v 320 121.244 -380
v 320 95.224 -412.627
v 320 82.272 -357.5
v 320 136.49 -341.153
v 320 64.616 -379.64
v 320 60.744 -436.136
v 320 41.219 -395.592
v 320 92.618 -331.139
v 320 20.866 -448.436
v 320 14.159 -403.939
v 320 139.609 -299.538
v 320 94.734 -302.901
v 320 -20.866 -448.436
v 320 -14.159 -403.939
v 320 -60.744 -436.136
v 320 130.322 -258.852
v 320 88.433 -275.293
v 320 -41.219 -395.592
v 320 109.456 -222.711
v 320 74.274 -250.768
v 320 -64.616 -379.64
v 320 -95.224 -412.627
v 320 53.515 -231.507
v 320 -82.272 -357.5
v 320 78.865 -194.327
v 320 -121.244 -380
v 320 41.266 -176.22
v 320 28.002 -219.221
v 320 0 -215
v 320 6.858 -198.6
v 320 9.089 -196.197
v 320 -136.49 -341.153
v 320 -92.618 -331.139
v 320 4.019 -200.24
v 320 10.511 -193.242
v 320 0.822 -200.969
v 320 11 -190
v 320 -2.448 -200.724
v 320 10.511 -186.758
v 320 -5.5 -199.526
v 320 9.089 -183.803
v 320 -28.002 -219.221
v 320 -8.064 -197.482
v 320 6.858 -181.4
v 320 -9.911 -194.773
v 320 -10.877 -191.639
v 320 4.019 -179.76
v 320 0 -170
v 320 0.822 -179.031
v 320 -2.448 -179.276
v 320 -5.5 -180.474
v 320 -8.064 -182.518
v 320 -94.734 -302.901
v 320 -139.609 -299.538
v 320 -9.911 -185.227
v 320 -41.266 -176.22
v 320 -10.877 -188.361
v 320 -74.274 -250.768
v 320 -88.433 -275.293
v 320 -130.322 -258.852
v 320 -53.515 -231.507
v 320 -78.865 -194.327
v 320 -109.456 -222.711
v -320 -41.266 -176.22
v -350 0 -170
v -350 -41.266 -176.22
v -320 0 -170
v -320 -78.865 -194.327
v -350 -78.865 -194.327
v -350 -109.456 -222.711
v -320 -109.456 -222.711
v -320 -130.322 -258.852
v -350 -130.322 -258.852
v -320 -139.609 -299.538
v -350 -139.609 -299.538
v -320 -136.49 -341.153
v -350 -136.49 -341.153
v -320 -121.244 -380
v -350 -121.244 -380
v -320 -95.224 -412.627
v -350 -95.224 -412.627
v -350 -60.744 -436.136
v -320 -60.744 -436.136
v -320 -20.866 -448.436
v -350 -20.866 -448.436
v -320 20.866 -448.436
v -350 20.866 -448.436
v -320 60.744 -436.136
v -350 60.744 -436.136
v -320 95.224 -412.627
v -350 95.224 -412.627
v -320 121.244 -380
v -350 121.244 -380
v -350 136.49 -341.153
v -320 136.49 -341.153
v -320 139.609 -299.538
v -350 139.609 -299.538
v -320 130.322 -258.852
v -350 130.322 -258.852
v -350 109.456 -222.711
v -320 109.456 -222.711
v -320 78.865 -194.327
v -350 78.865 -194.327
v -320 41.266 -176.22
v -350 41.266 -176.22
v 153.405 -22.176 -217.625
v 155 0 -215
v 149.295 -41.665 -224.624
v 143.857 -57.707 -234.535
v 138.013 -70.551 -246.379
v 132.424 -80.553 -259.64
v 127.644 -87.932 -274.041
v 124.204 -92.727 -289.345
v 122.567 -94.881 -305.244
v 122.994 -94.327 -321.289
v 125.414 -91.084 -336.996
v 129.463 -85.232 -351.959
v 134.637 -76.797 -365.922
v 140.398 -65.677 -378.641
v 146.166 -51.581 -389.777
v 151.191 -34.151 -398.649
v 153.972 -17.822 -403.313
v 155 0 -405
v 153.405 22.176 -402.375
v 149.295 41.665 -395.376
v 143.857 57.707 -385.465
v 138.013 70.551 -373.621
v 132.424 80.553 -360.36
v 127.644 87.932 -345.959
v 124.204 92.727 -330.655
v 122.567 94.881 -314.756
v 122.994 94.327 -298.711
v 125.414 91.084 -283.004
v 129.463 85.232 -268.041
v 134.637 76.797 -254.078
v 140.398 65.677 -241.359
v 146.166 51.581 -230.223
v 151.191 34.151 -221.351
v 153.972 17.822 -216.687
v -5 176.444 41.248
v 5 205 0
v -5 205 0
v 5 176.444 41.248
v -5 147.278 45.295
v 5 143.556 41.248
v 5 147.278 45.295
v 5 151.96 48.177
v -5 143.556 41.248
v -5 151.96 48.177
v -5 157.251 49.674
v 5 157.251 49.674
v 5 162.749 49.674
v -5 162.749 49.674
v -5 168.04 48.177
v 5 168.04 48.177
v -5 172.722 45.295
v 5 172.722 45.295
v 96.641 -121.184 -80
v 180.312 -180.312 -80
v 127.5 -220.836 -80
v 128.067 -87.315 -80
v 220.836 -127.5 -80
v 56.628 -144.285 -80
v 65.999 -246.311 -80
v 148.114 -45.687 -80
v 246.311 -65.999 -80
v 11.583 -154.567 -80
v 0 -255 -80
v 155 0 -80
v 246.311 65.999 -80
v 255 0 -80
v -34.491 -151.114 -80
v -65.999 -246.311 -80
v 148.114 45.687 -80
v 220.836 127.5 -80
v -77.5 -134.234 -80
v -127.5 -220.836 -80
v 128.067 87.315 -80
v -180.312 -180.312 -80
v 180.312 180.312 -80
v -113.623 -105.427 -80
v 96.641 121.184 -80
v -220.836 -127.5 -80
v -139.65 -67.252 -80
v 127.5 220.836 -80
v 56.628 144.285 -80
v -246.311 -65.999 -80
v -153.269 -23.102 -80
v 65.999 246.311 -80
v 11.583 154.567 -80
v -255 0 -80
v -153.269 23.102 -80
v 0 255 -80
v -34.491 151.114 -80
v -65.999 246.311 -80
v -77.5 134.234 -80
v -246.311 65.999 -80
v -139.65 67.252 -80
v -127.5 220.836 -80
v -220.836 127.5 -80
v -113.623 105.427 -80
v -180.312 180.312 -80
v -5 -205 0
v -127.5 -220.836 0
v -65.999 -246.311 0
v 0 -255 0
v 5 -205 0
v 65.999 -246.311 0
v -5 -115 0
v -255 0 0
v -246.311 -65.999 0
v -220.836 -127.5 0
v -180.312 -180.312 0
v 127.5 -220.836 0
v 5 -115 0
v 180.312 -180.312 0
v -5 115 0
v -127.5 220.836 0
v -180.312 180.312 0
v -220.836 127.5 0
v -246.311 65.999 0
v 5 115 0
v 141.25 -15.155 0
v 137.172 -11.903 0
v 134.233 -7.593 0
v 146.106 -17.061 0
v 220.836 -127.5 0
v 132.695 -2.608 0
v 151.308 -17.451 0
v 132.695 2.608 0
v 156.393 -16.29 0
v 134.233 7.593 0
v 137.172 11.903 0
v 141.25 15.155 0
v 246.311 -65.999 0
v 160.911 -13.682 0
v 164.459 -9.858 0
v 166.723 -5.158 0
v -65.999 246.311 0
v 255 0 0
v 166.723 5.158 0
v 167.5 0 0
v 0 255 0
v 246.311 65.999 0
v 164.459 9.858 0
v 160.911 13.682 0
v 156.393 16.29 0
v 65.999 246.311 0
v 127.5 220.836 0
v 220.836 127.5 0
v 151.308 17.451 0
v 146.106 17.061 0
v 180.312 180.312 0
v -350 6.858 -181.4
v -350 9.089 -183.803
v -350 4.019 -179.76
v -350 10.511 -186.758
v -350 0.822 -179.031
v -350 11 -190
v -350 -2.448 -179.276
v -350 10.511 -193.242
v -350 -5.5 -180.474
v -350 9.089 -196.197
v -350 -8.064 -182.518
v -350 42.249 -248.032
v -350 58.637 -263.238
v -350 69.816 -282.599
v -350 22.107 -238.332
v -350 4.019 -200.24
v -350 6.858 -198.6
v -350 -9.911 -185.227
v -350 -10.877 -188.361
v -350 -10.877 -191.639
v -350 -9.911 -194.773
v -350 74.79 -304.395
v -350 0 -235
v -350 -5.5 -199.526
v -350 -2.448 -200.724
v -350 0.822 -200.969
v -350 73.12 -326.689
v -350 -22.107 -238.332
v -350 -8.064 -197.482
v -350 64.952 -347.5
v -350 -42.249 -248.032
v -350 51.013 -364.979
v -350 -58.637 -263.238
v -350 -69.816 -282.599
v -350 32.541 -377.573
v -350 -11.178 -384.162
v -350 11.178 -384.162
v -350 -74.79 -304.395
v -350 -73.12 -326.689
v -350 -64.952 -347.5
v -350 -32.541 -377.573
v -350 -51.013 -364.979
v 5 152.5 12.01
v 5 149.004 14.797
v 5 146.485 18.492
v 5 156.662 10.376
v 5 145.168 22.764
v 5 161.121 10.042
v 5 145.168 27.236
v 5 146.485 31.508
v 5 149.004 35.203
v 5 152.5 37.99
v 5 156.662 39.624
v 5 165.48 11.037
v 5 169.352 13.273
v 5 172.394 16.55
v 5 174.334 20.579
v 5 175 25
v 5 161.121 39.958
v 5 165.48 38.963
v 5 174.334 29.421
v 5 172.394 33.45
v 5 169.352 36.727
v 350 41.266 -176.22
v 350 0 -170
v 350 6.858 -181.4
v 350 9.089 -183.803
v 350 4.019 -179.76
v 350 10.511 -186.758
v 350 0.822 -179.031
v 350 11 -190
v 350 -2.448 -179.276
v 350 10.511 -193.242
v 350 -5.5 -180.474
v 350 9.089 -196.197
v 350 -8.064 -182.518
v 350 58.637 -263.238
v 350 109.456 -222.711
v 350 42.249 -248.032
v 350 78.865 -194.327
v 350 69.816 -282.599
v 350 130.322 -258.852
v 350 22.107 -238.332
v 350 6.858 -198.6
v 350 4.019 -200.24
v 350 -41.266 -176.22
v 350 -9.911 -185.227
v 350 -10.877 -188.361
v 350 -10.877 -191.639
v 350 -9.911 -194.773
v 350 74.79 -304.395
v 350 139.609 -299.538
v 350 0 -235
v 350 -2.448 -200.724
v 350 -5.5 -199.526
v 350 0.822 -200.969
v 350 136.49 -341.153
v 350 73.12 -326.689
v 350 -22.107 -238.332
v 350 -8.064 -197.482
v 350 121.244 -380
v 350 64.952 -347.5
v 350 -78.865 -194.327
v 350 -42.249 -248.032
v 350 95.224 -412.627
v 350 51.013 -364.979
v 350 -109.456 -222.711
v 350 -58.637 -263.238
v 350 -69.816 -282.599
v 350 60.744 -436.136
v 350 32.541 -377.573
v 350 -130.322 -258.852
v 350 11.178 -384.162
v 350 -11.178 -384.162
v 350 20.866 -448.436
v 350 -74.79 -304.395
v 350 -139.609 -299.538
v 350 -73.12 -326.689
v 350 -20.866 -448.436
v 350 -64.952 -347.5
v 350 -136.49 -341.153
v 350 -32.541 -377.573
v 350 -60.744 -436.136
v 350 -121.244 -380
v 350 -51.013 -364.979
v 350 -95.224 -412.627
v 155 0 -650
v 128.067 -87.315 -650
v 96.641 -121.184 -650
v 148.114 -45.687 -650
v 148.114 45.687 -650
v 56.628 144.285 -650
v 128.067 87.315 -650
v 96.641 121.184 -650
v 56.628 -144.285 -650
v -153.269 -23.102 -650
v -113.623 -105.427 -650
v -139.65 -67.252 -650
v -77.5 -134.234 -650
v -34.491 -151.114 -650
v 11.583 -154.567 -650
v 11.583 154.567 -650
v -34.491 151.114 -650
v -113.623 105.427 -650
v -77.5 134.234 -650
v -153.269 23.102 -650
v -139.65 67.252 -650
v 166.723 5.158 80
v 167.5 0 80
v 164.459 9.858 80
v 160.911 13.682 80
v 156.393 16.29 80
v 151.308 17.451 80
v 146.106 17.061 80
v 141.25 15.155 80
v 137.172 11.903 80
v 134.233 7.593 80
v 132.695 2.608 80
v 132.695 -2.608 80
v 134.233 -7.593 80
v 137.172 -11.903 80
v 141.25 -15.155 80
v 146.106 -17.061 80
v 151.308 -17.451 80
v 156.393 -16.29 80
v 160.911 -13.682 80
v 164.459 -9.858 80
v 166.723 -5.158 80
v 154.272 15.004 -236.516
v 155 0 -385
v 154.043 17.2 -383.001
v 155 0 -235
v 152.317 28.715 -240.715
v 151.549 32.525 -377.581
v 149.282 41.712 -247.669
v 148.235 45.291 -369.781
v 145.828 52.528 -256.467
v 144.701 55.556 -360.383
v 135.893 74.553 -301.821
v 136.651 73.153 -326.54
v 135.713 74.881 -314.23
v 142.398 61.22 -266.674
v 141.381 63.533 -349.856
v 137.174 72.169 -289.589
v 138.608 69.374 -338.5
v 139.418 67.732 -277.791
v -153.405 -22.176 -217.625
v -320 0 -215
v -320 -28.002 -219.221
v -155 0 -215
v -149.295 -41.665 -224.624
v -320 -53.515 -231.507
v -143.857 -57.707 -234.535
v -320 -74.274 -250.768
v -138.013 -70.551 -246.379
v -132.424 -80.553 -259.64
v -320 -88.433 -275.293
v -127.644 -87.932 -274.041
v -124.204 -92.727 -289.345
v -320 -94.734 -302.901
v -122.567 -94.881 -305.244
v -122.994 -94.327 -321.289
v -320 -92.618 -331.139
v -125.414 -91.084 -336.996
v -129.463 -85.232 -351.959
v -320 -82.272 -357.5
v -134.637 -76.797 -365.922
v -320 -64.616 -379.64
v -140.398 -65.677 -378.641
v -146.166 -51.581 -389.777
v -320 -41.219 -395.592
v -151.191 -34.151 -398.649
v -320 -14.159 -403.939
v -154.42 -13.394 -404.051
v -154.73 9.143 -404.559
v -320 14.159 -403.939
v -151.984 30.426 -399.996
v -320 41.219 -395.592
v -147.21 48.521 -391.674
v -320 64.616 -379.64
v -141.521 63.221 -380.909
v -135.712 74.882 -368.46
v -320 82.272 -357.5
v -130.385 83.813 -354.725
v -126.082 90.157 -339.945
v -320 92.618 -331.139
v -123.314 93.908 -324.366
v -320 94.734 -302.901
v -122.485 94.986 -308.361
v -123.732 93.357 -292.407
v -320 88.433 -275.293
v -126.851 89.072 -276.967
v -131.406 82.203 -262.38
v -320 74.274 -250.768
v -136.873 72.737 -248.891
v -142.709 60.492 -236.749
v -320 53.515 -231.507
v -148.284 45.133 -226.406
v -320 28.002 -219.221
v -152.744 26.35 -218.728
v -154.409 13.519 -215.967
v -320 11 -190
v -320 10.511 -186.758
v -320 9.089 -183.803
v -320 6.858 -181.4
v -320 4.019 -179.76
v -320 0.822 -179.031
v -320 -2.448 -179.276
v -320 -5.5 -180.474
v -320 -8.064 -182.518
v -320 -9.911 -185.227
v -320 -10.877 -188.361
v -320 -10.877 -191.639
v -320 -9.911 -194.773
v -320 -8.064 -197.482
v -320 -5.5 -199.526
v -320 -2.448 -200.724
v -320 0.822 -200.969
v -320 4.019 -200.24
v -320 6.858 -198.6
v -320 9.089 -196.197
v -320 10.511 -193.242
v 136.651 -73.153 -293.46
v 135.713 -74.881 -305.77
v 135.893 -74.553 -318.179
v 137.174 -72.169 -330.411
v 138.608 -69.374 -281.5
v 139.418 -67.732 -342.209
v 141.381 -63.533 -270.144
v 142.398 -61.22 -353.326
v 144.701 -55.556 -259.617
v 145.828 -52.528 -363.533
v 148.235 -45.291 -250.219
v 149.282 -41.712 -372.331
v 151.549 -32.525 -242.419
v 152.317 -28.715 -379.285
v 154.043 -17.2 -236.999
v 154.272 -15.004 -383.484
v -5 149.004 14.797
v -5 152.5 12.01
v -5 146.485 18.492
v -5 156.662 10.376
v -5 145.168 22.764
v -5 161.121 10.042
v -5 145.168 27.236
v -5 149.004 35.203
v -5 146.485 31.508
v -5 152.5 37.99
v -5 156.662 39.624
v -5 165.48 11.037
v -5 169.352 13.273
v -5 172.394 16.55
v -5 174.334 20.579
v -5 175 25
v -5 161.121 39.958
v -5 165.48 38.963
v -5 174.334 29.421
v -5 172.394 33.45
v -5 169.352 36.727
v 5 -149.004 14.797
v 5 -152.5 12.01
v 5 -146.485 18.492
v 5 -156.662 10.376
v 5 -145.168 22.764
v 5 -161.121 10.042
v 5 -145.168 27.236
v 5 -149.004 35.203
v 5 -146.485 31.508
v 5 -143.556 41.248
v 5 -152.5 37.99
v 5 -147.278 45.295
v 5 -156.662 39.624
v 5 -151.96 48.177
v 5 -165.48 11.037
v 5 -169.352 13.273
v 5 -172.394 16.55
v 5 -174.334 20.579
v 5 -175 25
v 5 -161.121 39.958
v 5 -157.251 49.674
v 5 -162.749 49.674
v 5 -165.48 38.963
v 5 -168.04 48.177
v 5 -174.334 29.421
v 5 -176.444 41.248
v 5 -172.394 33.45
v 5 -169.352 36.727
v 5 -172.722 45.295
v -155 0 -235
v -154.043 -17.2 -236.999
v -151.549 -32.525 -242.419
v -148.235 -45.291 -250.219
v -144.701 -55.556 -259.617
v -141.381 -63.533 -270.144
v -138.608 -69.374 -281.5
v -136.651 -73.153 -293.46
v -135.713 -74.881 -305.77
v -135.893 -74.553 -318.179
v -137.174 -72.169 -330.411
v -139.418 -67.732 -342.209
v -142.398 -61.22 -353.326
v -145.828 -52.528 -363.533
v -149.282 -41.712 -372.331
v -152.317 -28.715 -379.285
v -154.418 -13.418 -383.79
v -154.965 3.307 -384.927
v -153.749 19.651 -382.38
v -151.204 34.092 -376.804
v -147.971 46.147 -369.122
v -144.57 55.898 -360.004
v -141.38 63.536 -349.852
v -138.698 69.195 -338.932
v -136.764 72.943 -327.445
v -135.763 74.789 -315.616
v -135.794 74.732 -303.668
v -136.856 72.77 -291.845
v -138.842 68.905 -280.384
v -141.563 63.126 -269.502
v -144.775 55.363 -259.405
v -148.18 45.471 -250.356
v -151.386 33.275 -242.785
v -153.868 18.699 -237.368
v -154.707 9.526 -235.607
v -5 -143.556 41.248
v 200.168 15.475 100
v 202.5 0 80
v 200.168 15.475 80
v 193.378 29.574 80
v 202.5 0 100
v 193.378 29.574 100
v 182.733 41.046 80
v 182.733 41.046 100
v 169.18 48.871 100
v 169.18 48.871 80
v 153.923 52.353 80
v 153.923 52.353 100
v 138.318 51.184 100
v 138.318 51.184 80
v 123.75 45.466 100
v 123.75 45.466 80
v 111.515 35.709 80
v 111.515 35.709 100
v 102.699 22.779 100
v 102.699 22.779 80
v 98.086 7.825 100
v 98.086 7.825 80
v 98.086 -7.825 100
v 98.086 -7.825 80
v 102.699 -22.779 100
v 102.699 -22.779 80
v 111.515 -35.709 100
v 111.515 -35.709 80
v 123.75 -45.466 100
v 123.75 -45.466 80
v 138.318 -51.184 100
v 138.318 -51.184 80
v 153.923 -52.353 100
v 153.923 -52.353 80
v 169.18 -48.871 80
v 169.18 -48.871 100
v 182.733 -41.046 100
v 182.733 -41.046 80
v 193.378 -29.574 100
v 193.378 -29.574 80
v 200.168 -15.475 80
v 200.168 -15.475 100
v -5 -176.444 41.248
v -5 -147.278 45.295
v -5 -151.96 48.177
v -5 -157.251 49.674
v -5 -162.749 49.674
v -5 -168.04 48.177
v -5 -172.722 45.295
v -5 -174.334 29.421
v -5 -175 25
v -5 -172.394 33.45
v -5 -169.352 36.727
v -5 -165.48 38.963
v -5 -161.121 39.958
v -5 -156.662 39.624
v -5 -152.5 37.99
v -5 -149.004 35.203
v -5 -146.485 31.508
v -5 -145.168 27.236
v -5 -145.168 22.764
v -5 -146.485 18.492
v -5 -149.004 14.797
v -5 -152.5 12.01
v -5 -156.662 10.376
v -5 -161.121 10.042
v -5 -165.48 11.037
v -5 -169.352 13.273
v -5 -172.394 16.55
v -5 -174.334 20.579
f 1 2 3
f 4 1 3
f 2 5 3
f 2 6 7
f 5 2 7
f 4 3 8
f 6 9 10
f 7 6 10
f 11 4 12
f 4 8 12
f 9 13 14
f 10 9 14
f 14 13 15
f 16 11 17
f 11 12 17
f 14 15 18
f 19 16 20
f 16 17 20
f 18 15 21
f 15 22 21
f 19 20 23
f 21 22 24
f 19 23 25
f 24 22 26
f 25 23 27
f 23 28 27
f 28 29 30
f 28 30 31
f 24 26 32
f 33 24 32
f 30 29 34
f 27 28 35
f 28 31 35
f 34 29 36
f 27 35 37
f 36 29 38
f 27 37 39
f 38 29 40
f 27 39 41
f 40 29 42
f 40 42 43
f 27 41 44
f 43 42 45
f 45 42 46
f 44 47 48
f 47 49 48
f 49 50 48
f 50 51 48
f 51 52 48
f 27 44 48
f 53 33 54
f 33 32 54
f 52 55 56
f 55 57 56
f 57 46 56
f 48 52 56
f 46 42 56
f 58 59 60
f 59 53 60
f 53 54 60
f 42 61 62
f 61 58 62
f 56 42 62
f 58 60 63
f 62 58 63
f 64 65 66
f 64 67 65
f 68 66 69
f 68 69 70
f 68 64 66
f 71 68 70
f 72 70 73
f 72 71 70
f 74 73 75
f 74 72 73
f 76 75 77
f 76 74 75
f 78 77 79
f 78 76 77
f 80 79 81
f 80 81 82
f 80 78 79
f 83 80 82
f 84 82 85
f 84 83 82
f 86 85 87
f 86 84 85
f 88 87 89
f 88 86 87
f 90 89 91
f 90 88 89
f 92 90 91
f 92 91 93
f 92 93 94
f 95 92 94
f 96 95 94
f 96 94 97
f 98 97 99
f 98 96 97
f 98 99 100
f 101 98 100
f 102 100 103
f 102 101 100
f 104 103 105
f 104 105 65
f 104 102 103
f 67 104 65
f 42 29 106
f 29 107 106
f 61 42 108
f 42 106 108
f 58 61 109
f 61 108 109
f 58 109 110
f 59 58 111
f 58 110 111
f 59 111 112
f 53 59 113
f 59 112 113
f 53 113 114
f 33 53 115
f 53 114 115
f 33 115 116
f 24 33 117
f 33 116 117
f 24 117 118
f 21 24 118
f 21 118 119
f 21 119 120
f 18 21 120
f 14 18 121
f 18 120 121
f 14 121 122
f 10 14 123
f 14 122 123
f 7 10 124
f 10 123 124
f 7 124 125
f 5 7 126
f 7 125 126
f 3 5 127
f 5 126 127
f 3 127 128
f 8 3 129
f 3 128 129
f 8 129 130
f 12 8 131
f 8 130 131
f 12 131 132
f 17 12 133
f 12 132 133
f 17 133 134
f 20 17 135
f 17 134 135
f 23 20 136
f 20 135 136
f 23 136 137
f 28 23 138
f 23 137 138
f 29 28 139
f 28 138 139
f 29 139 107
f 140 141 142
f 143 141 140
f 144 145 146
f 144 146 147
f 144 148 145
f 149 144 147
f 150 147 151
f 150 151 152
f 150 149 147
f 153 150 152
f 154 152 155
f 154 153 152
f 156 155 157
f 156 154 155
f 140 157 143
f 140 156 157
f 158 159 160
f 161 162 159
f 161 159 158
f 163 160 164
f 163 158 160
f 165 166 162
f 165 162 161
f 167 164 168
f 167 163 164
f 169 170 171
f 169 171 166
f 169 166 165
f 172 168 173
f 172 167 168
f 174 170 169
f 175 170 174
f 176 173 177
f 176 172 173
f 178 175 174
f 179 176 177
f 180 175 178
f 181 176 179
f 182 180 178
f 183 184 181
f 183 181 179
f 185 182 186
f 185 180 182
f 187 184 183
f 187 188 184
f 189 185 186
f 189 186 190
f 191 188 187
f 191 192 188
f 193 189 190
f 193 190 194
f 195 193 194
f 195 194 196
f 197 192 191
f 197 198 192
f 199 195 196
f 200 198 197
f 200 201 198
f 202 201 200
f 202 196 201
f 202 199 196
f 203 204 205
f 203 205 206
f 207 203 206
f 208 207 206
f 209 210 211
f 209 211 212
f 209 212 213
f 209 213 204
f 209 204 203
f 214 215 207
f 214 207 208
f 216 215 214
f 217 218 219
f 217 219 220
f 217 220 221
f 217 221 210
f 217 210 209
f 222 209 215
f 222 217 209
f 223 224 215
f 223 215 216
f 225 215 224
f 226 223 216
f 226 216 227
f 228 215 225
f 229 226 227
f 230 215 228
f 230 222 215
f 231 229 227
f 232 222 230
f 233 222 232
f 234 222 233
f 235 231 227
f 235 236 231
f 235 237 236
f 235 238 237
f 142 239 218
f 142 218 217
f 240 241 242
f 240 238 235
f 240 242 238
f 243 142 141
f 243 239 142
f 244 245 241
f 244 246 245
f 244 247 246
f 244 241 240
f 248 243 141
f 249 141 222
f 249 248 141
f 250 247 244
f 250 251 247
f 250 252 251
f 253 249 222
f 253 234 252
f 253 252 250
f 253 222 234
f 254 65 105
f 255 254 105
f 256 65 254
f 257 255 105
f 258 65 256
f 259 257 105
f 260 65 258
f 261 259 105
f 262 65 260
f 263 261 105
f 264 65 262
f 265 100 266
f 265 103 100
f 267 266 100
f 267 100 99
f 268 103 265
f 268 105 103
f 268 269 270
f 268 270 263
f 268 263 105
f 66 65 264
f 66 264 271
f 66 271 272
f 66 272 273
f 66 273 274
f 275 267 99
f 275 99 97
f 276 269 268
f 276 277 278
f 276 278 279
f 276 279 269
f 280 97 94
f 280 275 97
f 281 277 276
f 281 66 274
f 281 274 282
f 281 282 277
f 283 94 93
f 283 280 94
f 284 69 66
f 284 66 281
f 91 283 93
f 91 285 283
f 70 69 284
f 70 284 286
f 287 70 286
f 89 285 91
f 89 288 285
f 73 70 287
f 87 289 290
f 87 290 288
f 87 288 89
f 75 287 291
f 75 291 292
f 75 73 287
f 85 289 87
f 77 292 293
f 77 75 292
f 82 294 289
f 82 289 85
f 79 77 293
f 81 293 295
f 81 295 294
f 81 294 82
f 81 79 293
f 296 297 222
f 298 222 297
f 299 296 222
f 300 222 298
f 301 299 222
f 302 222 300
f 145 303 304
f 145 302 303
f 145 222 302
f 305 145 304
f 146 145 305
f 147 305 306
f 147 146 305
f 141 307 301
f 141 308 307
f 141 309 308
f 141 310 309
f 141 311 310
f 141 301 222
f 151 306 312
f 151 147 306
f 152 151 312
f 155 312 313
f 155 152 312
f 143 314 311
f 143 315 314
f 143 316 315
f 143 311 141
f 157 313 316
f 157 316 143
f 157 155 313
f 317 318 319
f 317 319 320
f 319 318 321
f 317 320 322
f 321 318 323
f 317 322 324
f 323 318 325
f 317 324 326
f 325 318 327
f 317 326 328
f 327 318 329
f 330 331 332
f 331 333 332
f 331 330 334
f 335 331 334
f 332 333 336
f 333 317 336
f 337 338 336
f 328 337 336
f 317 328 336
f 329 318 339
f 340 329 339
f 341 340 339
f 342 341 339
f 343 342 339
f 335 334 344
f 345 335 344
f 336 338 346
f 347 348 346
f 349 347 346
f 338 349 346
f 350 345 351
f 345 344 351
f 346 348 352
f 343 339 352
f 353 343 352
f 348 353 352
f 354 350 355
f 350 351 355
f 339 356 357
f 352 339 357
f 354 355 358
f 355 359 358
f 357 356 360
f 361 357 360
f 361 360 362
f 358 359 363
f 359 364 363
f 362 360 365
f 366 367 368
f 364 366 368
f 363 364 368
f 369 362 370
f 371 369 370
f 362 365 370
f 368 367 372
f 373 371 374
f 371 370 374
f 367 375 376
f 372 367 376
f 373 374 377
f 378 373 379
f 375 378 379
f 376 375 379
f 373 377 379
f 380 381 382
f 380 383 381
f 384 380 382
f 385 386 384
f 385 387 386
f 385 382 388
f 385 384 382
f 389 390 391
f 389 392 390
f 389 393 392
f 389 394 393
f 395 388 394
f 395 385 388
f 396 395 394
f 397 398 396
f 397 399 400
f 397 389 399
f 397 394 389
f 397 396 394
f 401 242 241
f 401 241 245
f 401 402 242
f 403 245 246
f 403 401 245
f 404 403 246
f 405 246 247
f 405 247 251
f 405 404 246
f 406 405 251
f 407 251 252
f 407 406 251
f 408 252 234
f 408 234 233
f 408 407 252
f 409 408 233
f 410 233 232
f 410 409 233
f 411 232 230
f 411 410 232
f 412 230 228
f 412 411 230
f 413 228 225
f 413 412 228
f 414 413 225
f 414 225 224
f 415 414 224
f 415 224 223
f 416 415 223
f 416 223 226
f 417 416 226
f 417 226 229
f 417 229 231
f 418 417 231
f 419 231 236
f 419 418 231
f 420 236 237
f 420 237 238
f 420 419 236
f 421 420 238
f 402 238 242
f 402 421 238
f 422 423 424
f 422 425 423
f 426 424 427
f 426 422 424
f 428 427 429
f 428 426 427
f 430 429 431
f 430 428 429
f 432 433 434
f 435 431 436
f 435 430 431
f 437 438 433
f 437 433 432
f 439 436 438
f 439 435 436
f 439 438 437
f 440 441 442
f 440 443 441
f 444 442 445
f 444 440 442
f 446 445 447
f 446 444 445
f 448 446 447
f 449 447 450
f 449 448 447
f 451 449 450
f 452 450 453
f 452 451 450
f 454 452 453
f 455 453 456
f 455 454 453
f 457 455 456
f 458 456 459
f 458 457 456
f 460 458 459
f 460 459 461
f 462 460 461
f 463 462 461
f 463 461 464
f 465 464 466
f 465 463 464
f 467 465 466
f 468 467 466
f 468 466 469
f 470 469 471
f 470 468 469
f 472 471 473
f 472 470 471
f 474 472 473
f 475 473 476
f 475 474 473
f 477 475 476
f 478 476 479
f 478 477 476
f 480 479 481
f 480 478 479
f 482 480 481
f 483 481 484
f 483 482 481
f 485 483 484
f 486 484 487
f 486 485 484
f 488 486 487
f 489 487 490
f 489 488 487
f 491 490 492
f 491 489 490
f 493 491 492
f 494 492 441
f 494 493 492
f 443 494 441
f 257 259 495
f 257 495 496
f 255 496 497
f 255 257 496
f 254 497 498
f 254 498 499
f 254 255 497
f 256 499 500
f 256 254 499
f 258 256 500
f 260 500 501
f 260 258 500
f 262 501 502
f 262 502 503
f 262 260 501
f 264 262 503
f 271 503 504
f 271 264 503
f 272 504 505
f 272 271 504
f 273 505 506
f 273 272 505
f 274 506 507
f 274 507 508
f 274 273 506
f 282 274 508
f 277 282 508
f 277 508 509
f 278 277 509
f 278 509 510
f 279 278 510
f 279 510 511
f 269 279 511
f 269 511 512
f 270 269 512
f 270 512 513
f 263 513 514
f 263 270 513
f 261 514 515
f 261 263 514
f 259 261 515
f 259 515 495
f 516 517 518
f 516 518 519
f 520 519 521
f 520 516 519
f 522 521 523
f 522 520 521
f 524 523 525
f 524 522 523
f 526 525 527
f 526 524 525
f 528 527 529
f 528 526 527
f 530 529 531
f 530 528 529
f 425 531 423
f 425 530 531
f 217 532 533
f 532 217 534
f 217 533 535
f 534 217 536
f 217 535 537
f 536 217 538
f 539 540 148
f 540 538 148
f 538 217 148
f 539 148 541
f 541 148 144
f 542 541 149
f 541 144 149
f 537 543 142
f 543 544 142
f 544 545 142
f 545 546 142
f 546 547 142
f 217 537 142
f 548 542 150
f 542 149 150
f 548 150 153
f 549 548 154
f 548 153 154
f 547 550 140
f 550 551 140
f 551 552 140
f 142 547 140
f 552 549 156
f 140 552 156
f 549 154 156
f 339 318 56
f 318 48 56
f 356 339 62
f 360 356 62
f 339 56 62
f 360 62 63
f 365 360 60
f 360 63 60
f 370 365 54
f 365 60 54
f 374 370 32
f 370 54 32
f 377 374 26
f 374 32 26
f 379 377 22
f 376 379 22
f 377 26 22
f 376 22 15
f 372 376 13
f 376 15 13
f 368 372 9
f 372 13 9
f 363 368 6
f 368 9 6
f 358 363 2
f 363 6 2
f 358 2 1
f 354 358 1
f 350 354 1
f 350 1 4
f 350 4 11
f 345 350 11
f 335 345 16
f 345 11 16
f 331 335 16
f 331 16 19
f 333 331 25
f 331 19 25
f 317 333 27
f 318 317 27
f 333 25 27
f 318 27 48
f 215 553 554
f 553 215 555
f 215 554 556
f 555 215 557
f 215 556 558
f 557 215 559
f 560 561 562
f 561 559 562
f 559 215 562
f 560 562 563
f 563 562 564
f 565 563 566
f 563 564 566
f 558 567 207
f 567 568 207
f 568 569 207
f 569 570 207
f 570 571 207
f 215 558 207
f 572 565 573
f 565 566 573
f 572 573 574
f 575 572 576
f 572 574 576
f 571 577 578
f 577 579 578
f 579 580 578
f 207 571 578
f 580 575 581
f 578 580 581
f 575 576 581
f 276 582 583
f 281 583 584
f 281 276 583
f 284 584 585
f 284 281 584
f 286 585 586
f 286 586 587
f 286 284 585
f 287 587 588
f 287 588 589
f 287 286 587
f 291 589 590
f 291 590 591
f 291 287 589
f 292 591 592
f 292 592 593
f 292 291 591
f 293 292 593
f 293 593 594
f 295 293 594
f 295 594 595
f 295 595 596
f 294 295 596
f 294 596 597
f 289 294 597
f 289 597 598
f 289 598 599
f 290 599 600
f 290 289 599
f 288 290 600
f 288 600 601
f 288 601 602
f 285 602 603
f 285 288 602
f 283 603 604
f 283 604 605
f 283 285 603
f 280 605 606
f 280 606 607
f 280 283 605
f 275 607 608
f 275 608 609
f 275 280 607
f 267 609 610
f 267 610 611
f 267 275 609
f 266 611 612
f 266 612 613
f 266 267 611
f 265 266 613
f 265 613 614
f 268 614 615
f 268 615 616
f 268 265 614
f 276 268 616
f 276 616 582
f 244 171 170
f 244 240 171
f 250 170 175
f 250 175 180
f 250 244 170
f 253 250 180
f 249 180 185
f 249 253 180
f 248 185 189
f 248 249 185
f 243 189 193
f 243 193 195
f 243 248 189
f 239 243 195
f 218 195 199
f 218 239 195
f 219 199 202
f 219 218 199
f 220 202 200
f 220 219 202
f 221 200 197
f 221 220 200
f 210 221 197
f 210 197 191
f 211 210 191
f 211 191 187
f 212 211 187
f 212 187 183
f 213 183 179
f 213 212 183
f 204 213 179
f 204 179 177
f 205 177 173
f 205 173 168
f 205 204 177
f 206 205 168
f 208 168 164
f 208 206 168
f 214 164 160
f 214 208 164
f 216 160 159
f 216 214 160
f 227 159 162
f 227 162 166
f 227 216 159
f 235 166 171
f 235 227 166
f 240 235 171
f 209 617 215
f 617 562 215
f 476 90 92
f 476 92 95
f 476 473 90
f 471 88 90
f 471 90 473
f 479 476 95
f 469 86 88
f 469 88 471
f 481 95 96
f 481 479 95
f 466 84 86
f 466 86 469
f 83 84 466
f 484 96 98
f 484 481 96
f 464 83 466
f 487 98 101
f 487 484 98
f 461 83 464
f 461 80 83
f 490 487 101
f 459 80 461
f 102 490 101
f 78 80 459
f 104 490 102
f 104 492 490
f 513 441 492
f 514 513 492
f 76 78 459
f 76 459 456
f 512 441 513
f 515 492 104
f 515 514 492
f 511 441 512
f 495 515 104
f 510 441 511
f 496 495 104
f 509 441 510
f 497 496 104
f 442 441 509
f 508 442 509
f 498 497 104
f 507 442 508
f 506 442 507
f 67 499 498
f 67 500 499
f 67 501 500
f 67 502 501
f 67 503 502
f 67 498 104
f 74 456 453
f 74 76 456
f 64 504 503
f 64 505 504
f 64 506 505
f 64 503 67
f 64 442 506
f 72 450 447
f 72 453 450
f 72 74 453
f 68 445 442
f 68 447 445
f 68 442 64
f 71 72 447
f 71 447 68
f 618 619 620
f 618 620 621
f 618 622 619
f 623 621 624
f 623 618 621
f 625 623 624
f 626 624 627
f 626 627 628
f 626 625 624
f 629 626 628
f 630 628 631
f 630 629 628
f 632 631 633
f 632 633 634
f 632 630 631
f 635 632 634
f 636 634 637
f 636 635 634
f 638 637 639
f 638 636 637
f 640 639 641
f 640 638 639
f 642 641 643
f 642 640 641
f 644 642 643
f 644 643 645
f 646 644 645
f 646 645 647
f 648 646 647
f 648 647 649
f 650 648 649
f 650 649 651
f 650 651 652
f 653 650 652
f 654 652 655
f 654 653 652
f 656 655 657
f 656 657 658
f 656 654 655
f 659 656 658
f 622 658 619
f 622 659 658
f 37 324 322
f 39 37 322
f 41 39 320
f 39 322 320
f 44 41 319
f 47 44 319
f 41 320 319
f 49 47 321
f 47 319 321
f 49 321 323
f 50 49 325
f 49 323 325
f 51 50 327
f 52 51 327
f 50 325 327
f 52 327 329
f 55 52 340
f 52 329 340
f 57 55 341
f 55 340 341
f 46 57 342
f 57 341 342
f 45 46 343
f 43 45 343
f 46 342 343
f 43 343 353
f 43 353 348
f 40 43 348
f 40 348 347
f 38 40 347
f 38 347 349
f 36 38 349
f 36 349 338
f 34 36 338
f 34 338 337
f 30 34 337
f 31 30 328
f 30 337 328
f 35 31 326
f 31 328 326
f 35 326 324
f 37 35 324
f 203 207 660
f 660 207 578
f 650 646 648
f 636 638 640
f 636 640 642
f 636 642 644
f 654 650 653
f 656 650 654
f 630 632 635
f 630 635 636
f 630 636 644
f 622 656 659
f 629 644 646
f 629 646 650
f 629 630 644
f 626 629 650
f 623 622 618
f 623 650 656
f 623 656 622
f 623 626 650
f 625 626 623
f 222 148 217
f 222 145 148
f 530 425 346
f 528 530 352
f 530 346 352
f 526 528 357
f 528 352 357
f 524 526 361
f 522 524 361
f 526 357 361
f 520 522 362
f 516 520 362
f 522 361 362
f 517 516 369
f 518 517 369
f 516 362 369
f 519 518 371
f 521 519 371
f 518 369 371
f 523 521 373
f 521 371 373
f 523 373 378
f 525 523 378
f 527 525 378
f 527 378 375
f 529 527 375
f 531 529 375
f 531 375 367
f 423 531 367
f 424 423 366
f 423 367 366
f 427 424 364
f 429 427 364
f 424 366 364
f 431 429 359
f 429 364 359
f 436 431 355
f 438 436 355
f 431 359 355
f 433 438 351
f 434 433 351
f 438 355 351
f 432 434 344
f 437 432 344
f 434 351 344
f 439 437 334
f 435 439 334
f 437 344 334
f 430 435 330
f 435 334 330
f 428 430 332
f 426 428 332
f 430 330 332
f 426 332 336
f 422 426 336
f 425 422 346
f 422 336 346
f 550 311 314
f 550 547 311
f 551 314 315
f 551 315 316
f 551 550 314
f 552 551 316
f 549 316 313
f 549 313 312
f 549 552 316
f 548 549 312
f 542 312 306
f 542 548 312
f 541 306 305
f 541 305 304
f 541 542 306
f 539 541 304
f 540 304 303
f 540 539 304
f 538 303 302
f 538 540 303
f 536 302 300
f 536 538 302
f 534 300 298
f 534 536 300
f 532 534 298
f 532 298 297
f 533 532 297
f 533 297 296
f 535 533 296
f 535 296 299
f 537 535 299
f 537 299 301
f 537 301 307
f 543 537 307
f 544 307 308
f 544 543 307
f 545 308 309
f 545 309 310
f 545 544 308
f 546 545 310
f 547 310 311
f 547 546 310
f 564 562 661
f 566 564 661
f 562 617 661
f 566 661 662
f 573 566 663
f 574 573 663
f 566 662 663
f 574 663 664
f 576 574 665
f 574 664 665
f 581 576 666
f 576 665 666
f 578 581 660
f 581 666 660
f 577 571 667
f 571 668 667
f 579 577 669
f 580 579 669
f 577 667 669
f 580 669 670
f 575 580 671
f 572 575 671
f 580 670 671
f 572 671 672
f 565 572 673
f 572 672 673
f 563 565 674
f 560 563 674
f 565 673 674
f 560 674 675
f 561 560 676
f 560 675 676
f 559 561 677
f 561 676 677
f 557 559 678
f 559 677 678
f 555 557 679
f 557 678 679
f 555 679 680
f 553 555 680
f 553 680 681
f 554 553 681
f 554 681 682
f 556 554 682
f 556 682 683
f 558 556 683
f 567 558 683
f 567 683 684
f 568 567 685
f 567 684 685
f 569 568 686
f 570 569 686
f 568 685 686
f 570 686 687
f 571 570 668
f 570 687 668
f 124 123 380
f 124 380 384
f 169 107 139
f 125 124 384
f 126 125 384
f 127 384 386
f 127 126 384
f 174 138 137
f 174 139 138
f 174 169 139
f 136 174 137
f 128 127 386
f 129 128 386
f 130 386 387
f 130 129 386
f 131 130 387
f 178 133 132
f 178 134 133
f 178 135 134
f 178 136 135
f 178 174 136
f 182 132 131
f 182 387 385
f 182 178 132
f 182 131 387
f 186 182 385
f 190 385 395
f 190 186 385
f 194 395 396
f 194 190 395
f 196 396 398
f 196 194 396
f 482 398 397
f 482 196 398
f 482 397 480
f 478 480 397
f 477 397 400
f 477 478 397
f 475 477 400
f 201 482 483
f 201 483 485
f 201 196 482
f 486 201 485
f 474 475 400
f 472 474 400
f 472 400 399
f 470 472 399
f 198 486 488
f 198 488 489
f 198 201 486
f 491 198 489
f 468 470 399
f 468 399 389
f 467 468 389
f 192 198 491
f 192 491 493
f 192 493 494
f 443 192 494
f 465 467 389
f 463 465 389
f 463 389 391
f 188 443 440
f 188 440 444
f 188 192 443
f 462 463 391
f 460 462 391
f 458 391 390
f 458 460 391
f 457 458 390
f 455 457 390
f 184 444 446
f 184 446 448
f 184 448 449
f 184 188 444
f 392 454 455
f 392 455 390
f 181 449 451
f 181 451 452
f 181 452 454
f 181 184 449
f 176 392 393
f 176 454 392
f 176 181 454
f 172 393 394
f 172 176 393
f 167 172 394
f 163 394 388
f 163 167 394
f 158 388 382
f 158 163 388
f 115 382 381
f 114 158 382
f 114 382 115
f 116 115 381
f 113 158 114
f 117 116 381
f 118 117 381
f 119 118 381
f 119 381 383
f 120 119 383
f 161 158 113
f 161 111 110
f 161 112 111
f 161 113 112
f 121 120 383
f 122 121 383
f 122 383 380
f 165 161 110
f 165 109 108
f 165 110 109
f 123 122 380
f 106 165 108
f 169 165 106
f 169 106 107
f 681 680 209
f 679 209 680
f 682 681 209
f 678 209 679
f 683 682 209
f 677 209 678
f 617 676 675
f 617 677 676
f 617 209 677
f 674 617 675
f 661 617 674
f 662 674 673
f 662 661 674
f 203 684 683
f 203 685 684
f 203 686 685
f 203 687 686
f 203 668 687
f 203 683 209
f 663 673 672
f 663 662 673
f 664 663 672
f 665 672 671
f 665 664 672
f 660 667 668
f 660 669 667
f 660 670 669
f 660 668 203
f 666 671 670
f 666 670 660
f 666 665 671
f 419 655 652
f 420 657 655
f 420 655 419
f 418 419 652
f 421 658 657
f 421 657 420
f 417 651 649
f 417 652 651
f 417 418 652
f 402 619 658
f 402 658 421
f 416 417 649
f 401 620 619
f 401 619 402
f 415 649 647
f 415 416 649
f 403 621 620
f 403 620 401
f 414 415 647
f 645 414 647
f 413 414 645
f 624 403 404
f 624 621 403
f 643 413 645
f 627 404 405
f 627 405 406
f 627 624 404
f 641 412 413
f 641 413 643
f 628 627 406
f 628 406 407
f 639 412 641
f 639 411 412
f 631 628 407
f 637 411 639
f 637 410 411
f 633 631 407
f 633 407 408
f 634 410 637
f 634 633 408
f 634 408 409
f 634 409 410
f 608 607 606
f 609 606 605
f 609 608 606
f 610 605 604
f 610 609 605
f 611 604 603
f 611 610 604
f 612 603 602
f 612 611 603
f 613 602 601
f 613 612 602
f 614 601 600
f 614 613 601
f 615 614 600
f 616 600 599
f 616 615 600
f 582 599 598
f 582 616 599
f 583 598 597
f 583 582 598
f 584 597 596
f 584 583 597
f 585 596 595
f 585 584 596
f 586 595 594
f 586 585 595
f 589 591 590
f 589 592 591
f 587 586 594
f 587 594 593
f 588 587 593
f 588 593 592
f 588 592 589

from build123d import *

# Parameters (mm, degrees)
F3_R      = 15
F4_DEPTH  = 5
F5_R      = 20
F9_R      = 11
F10_DEPTH = 30


with BuildPart() as f2:
    # F1 (on Front) → F2 (revolve)
    with BuildSketch(Plane.XZ):
        Polygon((150, 100), (150, 0), (167.5, 0), (167.5, 80), (202.5, 80), (202.5, 100), align=None)
    revolve(axis=Axis((150, 0, 50), (0, 0, 1)))



with BuildPart() as f4:
    # F3 (on Right) → F4 (new body, symmetric)
    with BuildSketch(Plane.YZ):
        Polygon((115, 0), (205, 0), (160, 65), align=None)
        with Locations((160, 25)):
            Circle(F3_R, mode=Mode.SUBTRACT)
    extrude(amount=F4_DEPTH, both=True)

    # F5
    f5_edges = [f4.edges().sort_by_distance(p)[0] for p in [
        (0, 160, 65),
    ]]
    fillet(f5_edges, radius=F5_R)


with BuildPart() as f6_1:
    # F6: instance of F4
    add(f4.part.mirror(Plane.XZ))


with BuildPart() as f8:
    # F7 (on Front) → F8 (revolve)
    with BuildSketch(Plane.XZ):
        Polygon((0, -235), (350, -235), (350, -170), (320, -170), (320, -215), (0, -215), align=None)
    revolve(axis=Axis((246.6098368168, 0, -310), (1, 0, 0)))

    # F9 (on face) → F10 (cut, through all)
    with BuildSketch(Plane.YZ.offset(350)):
        with Locations((0, -190)):
            Circle(F9_R)
    extrude(amount=-F10_DEPTH, mode=Mode.SUBTRACT)

    # F11: F8 across plane


with BuildPart() as f8_1:
    add(f8.part)
    add(f8.part.mirror(Plane.YZ))


with BuildPart() as f2_1:
    add(f2.part)

    add(f4.part)  # F12 merges F4

    add(f6_1.part)  # F12 merges F6_1

    add(f8_1.part)  # F12 merges F8
    # F0 (on Front) → F12 (revolve)
    with BuildSketch(Plane.XZ):
        Polygon((255, 0), (0, 0), (0, -650), (155, -650), (155, -80), (255, -80), align=None)
    revolve(axis=Axis((0, 0, 290.8246964216), (0, 0, 1)))


solid = f2_1.part
